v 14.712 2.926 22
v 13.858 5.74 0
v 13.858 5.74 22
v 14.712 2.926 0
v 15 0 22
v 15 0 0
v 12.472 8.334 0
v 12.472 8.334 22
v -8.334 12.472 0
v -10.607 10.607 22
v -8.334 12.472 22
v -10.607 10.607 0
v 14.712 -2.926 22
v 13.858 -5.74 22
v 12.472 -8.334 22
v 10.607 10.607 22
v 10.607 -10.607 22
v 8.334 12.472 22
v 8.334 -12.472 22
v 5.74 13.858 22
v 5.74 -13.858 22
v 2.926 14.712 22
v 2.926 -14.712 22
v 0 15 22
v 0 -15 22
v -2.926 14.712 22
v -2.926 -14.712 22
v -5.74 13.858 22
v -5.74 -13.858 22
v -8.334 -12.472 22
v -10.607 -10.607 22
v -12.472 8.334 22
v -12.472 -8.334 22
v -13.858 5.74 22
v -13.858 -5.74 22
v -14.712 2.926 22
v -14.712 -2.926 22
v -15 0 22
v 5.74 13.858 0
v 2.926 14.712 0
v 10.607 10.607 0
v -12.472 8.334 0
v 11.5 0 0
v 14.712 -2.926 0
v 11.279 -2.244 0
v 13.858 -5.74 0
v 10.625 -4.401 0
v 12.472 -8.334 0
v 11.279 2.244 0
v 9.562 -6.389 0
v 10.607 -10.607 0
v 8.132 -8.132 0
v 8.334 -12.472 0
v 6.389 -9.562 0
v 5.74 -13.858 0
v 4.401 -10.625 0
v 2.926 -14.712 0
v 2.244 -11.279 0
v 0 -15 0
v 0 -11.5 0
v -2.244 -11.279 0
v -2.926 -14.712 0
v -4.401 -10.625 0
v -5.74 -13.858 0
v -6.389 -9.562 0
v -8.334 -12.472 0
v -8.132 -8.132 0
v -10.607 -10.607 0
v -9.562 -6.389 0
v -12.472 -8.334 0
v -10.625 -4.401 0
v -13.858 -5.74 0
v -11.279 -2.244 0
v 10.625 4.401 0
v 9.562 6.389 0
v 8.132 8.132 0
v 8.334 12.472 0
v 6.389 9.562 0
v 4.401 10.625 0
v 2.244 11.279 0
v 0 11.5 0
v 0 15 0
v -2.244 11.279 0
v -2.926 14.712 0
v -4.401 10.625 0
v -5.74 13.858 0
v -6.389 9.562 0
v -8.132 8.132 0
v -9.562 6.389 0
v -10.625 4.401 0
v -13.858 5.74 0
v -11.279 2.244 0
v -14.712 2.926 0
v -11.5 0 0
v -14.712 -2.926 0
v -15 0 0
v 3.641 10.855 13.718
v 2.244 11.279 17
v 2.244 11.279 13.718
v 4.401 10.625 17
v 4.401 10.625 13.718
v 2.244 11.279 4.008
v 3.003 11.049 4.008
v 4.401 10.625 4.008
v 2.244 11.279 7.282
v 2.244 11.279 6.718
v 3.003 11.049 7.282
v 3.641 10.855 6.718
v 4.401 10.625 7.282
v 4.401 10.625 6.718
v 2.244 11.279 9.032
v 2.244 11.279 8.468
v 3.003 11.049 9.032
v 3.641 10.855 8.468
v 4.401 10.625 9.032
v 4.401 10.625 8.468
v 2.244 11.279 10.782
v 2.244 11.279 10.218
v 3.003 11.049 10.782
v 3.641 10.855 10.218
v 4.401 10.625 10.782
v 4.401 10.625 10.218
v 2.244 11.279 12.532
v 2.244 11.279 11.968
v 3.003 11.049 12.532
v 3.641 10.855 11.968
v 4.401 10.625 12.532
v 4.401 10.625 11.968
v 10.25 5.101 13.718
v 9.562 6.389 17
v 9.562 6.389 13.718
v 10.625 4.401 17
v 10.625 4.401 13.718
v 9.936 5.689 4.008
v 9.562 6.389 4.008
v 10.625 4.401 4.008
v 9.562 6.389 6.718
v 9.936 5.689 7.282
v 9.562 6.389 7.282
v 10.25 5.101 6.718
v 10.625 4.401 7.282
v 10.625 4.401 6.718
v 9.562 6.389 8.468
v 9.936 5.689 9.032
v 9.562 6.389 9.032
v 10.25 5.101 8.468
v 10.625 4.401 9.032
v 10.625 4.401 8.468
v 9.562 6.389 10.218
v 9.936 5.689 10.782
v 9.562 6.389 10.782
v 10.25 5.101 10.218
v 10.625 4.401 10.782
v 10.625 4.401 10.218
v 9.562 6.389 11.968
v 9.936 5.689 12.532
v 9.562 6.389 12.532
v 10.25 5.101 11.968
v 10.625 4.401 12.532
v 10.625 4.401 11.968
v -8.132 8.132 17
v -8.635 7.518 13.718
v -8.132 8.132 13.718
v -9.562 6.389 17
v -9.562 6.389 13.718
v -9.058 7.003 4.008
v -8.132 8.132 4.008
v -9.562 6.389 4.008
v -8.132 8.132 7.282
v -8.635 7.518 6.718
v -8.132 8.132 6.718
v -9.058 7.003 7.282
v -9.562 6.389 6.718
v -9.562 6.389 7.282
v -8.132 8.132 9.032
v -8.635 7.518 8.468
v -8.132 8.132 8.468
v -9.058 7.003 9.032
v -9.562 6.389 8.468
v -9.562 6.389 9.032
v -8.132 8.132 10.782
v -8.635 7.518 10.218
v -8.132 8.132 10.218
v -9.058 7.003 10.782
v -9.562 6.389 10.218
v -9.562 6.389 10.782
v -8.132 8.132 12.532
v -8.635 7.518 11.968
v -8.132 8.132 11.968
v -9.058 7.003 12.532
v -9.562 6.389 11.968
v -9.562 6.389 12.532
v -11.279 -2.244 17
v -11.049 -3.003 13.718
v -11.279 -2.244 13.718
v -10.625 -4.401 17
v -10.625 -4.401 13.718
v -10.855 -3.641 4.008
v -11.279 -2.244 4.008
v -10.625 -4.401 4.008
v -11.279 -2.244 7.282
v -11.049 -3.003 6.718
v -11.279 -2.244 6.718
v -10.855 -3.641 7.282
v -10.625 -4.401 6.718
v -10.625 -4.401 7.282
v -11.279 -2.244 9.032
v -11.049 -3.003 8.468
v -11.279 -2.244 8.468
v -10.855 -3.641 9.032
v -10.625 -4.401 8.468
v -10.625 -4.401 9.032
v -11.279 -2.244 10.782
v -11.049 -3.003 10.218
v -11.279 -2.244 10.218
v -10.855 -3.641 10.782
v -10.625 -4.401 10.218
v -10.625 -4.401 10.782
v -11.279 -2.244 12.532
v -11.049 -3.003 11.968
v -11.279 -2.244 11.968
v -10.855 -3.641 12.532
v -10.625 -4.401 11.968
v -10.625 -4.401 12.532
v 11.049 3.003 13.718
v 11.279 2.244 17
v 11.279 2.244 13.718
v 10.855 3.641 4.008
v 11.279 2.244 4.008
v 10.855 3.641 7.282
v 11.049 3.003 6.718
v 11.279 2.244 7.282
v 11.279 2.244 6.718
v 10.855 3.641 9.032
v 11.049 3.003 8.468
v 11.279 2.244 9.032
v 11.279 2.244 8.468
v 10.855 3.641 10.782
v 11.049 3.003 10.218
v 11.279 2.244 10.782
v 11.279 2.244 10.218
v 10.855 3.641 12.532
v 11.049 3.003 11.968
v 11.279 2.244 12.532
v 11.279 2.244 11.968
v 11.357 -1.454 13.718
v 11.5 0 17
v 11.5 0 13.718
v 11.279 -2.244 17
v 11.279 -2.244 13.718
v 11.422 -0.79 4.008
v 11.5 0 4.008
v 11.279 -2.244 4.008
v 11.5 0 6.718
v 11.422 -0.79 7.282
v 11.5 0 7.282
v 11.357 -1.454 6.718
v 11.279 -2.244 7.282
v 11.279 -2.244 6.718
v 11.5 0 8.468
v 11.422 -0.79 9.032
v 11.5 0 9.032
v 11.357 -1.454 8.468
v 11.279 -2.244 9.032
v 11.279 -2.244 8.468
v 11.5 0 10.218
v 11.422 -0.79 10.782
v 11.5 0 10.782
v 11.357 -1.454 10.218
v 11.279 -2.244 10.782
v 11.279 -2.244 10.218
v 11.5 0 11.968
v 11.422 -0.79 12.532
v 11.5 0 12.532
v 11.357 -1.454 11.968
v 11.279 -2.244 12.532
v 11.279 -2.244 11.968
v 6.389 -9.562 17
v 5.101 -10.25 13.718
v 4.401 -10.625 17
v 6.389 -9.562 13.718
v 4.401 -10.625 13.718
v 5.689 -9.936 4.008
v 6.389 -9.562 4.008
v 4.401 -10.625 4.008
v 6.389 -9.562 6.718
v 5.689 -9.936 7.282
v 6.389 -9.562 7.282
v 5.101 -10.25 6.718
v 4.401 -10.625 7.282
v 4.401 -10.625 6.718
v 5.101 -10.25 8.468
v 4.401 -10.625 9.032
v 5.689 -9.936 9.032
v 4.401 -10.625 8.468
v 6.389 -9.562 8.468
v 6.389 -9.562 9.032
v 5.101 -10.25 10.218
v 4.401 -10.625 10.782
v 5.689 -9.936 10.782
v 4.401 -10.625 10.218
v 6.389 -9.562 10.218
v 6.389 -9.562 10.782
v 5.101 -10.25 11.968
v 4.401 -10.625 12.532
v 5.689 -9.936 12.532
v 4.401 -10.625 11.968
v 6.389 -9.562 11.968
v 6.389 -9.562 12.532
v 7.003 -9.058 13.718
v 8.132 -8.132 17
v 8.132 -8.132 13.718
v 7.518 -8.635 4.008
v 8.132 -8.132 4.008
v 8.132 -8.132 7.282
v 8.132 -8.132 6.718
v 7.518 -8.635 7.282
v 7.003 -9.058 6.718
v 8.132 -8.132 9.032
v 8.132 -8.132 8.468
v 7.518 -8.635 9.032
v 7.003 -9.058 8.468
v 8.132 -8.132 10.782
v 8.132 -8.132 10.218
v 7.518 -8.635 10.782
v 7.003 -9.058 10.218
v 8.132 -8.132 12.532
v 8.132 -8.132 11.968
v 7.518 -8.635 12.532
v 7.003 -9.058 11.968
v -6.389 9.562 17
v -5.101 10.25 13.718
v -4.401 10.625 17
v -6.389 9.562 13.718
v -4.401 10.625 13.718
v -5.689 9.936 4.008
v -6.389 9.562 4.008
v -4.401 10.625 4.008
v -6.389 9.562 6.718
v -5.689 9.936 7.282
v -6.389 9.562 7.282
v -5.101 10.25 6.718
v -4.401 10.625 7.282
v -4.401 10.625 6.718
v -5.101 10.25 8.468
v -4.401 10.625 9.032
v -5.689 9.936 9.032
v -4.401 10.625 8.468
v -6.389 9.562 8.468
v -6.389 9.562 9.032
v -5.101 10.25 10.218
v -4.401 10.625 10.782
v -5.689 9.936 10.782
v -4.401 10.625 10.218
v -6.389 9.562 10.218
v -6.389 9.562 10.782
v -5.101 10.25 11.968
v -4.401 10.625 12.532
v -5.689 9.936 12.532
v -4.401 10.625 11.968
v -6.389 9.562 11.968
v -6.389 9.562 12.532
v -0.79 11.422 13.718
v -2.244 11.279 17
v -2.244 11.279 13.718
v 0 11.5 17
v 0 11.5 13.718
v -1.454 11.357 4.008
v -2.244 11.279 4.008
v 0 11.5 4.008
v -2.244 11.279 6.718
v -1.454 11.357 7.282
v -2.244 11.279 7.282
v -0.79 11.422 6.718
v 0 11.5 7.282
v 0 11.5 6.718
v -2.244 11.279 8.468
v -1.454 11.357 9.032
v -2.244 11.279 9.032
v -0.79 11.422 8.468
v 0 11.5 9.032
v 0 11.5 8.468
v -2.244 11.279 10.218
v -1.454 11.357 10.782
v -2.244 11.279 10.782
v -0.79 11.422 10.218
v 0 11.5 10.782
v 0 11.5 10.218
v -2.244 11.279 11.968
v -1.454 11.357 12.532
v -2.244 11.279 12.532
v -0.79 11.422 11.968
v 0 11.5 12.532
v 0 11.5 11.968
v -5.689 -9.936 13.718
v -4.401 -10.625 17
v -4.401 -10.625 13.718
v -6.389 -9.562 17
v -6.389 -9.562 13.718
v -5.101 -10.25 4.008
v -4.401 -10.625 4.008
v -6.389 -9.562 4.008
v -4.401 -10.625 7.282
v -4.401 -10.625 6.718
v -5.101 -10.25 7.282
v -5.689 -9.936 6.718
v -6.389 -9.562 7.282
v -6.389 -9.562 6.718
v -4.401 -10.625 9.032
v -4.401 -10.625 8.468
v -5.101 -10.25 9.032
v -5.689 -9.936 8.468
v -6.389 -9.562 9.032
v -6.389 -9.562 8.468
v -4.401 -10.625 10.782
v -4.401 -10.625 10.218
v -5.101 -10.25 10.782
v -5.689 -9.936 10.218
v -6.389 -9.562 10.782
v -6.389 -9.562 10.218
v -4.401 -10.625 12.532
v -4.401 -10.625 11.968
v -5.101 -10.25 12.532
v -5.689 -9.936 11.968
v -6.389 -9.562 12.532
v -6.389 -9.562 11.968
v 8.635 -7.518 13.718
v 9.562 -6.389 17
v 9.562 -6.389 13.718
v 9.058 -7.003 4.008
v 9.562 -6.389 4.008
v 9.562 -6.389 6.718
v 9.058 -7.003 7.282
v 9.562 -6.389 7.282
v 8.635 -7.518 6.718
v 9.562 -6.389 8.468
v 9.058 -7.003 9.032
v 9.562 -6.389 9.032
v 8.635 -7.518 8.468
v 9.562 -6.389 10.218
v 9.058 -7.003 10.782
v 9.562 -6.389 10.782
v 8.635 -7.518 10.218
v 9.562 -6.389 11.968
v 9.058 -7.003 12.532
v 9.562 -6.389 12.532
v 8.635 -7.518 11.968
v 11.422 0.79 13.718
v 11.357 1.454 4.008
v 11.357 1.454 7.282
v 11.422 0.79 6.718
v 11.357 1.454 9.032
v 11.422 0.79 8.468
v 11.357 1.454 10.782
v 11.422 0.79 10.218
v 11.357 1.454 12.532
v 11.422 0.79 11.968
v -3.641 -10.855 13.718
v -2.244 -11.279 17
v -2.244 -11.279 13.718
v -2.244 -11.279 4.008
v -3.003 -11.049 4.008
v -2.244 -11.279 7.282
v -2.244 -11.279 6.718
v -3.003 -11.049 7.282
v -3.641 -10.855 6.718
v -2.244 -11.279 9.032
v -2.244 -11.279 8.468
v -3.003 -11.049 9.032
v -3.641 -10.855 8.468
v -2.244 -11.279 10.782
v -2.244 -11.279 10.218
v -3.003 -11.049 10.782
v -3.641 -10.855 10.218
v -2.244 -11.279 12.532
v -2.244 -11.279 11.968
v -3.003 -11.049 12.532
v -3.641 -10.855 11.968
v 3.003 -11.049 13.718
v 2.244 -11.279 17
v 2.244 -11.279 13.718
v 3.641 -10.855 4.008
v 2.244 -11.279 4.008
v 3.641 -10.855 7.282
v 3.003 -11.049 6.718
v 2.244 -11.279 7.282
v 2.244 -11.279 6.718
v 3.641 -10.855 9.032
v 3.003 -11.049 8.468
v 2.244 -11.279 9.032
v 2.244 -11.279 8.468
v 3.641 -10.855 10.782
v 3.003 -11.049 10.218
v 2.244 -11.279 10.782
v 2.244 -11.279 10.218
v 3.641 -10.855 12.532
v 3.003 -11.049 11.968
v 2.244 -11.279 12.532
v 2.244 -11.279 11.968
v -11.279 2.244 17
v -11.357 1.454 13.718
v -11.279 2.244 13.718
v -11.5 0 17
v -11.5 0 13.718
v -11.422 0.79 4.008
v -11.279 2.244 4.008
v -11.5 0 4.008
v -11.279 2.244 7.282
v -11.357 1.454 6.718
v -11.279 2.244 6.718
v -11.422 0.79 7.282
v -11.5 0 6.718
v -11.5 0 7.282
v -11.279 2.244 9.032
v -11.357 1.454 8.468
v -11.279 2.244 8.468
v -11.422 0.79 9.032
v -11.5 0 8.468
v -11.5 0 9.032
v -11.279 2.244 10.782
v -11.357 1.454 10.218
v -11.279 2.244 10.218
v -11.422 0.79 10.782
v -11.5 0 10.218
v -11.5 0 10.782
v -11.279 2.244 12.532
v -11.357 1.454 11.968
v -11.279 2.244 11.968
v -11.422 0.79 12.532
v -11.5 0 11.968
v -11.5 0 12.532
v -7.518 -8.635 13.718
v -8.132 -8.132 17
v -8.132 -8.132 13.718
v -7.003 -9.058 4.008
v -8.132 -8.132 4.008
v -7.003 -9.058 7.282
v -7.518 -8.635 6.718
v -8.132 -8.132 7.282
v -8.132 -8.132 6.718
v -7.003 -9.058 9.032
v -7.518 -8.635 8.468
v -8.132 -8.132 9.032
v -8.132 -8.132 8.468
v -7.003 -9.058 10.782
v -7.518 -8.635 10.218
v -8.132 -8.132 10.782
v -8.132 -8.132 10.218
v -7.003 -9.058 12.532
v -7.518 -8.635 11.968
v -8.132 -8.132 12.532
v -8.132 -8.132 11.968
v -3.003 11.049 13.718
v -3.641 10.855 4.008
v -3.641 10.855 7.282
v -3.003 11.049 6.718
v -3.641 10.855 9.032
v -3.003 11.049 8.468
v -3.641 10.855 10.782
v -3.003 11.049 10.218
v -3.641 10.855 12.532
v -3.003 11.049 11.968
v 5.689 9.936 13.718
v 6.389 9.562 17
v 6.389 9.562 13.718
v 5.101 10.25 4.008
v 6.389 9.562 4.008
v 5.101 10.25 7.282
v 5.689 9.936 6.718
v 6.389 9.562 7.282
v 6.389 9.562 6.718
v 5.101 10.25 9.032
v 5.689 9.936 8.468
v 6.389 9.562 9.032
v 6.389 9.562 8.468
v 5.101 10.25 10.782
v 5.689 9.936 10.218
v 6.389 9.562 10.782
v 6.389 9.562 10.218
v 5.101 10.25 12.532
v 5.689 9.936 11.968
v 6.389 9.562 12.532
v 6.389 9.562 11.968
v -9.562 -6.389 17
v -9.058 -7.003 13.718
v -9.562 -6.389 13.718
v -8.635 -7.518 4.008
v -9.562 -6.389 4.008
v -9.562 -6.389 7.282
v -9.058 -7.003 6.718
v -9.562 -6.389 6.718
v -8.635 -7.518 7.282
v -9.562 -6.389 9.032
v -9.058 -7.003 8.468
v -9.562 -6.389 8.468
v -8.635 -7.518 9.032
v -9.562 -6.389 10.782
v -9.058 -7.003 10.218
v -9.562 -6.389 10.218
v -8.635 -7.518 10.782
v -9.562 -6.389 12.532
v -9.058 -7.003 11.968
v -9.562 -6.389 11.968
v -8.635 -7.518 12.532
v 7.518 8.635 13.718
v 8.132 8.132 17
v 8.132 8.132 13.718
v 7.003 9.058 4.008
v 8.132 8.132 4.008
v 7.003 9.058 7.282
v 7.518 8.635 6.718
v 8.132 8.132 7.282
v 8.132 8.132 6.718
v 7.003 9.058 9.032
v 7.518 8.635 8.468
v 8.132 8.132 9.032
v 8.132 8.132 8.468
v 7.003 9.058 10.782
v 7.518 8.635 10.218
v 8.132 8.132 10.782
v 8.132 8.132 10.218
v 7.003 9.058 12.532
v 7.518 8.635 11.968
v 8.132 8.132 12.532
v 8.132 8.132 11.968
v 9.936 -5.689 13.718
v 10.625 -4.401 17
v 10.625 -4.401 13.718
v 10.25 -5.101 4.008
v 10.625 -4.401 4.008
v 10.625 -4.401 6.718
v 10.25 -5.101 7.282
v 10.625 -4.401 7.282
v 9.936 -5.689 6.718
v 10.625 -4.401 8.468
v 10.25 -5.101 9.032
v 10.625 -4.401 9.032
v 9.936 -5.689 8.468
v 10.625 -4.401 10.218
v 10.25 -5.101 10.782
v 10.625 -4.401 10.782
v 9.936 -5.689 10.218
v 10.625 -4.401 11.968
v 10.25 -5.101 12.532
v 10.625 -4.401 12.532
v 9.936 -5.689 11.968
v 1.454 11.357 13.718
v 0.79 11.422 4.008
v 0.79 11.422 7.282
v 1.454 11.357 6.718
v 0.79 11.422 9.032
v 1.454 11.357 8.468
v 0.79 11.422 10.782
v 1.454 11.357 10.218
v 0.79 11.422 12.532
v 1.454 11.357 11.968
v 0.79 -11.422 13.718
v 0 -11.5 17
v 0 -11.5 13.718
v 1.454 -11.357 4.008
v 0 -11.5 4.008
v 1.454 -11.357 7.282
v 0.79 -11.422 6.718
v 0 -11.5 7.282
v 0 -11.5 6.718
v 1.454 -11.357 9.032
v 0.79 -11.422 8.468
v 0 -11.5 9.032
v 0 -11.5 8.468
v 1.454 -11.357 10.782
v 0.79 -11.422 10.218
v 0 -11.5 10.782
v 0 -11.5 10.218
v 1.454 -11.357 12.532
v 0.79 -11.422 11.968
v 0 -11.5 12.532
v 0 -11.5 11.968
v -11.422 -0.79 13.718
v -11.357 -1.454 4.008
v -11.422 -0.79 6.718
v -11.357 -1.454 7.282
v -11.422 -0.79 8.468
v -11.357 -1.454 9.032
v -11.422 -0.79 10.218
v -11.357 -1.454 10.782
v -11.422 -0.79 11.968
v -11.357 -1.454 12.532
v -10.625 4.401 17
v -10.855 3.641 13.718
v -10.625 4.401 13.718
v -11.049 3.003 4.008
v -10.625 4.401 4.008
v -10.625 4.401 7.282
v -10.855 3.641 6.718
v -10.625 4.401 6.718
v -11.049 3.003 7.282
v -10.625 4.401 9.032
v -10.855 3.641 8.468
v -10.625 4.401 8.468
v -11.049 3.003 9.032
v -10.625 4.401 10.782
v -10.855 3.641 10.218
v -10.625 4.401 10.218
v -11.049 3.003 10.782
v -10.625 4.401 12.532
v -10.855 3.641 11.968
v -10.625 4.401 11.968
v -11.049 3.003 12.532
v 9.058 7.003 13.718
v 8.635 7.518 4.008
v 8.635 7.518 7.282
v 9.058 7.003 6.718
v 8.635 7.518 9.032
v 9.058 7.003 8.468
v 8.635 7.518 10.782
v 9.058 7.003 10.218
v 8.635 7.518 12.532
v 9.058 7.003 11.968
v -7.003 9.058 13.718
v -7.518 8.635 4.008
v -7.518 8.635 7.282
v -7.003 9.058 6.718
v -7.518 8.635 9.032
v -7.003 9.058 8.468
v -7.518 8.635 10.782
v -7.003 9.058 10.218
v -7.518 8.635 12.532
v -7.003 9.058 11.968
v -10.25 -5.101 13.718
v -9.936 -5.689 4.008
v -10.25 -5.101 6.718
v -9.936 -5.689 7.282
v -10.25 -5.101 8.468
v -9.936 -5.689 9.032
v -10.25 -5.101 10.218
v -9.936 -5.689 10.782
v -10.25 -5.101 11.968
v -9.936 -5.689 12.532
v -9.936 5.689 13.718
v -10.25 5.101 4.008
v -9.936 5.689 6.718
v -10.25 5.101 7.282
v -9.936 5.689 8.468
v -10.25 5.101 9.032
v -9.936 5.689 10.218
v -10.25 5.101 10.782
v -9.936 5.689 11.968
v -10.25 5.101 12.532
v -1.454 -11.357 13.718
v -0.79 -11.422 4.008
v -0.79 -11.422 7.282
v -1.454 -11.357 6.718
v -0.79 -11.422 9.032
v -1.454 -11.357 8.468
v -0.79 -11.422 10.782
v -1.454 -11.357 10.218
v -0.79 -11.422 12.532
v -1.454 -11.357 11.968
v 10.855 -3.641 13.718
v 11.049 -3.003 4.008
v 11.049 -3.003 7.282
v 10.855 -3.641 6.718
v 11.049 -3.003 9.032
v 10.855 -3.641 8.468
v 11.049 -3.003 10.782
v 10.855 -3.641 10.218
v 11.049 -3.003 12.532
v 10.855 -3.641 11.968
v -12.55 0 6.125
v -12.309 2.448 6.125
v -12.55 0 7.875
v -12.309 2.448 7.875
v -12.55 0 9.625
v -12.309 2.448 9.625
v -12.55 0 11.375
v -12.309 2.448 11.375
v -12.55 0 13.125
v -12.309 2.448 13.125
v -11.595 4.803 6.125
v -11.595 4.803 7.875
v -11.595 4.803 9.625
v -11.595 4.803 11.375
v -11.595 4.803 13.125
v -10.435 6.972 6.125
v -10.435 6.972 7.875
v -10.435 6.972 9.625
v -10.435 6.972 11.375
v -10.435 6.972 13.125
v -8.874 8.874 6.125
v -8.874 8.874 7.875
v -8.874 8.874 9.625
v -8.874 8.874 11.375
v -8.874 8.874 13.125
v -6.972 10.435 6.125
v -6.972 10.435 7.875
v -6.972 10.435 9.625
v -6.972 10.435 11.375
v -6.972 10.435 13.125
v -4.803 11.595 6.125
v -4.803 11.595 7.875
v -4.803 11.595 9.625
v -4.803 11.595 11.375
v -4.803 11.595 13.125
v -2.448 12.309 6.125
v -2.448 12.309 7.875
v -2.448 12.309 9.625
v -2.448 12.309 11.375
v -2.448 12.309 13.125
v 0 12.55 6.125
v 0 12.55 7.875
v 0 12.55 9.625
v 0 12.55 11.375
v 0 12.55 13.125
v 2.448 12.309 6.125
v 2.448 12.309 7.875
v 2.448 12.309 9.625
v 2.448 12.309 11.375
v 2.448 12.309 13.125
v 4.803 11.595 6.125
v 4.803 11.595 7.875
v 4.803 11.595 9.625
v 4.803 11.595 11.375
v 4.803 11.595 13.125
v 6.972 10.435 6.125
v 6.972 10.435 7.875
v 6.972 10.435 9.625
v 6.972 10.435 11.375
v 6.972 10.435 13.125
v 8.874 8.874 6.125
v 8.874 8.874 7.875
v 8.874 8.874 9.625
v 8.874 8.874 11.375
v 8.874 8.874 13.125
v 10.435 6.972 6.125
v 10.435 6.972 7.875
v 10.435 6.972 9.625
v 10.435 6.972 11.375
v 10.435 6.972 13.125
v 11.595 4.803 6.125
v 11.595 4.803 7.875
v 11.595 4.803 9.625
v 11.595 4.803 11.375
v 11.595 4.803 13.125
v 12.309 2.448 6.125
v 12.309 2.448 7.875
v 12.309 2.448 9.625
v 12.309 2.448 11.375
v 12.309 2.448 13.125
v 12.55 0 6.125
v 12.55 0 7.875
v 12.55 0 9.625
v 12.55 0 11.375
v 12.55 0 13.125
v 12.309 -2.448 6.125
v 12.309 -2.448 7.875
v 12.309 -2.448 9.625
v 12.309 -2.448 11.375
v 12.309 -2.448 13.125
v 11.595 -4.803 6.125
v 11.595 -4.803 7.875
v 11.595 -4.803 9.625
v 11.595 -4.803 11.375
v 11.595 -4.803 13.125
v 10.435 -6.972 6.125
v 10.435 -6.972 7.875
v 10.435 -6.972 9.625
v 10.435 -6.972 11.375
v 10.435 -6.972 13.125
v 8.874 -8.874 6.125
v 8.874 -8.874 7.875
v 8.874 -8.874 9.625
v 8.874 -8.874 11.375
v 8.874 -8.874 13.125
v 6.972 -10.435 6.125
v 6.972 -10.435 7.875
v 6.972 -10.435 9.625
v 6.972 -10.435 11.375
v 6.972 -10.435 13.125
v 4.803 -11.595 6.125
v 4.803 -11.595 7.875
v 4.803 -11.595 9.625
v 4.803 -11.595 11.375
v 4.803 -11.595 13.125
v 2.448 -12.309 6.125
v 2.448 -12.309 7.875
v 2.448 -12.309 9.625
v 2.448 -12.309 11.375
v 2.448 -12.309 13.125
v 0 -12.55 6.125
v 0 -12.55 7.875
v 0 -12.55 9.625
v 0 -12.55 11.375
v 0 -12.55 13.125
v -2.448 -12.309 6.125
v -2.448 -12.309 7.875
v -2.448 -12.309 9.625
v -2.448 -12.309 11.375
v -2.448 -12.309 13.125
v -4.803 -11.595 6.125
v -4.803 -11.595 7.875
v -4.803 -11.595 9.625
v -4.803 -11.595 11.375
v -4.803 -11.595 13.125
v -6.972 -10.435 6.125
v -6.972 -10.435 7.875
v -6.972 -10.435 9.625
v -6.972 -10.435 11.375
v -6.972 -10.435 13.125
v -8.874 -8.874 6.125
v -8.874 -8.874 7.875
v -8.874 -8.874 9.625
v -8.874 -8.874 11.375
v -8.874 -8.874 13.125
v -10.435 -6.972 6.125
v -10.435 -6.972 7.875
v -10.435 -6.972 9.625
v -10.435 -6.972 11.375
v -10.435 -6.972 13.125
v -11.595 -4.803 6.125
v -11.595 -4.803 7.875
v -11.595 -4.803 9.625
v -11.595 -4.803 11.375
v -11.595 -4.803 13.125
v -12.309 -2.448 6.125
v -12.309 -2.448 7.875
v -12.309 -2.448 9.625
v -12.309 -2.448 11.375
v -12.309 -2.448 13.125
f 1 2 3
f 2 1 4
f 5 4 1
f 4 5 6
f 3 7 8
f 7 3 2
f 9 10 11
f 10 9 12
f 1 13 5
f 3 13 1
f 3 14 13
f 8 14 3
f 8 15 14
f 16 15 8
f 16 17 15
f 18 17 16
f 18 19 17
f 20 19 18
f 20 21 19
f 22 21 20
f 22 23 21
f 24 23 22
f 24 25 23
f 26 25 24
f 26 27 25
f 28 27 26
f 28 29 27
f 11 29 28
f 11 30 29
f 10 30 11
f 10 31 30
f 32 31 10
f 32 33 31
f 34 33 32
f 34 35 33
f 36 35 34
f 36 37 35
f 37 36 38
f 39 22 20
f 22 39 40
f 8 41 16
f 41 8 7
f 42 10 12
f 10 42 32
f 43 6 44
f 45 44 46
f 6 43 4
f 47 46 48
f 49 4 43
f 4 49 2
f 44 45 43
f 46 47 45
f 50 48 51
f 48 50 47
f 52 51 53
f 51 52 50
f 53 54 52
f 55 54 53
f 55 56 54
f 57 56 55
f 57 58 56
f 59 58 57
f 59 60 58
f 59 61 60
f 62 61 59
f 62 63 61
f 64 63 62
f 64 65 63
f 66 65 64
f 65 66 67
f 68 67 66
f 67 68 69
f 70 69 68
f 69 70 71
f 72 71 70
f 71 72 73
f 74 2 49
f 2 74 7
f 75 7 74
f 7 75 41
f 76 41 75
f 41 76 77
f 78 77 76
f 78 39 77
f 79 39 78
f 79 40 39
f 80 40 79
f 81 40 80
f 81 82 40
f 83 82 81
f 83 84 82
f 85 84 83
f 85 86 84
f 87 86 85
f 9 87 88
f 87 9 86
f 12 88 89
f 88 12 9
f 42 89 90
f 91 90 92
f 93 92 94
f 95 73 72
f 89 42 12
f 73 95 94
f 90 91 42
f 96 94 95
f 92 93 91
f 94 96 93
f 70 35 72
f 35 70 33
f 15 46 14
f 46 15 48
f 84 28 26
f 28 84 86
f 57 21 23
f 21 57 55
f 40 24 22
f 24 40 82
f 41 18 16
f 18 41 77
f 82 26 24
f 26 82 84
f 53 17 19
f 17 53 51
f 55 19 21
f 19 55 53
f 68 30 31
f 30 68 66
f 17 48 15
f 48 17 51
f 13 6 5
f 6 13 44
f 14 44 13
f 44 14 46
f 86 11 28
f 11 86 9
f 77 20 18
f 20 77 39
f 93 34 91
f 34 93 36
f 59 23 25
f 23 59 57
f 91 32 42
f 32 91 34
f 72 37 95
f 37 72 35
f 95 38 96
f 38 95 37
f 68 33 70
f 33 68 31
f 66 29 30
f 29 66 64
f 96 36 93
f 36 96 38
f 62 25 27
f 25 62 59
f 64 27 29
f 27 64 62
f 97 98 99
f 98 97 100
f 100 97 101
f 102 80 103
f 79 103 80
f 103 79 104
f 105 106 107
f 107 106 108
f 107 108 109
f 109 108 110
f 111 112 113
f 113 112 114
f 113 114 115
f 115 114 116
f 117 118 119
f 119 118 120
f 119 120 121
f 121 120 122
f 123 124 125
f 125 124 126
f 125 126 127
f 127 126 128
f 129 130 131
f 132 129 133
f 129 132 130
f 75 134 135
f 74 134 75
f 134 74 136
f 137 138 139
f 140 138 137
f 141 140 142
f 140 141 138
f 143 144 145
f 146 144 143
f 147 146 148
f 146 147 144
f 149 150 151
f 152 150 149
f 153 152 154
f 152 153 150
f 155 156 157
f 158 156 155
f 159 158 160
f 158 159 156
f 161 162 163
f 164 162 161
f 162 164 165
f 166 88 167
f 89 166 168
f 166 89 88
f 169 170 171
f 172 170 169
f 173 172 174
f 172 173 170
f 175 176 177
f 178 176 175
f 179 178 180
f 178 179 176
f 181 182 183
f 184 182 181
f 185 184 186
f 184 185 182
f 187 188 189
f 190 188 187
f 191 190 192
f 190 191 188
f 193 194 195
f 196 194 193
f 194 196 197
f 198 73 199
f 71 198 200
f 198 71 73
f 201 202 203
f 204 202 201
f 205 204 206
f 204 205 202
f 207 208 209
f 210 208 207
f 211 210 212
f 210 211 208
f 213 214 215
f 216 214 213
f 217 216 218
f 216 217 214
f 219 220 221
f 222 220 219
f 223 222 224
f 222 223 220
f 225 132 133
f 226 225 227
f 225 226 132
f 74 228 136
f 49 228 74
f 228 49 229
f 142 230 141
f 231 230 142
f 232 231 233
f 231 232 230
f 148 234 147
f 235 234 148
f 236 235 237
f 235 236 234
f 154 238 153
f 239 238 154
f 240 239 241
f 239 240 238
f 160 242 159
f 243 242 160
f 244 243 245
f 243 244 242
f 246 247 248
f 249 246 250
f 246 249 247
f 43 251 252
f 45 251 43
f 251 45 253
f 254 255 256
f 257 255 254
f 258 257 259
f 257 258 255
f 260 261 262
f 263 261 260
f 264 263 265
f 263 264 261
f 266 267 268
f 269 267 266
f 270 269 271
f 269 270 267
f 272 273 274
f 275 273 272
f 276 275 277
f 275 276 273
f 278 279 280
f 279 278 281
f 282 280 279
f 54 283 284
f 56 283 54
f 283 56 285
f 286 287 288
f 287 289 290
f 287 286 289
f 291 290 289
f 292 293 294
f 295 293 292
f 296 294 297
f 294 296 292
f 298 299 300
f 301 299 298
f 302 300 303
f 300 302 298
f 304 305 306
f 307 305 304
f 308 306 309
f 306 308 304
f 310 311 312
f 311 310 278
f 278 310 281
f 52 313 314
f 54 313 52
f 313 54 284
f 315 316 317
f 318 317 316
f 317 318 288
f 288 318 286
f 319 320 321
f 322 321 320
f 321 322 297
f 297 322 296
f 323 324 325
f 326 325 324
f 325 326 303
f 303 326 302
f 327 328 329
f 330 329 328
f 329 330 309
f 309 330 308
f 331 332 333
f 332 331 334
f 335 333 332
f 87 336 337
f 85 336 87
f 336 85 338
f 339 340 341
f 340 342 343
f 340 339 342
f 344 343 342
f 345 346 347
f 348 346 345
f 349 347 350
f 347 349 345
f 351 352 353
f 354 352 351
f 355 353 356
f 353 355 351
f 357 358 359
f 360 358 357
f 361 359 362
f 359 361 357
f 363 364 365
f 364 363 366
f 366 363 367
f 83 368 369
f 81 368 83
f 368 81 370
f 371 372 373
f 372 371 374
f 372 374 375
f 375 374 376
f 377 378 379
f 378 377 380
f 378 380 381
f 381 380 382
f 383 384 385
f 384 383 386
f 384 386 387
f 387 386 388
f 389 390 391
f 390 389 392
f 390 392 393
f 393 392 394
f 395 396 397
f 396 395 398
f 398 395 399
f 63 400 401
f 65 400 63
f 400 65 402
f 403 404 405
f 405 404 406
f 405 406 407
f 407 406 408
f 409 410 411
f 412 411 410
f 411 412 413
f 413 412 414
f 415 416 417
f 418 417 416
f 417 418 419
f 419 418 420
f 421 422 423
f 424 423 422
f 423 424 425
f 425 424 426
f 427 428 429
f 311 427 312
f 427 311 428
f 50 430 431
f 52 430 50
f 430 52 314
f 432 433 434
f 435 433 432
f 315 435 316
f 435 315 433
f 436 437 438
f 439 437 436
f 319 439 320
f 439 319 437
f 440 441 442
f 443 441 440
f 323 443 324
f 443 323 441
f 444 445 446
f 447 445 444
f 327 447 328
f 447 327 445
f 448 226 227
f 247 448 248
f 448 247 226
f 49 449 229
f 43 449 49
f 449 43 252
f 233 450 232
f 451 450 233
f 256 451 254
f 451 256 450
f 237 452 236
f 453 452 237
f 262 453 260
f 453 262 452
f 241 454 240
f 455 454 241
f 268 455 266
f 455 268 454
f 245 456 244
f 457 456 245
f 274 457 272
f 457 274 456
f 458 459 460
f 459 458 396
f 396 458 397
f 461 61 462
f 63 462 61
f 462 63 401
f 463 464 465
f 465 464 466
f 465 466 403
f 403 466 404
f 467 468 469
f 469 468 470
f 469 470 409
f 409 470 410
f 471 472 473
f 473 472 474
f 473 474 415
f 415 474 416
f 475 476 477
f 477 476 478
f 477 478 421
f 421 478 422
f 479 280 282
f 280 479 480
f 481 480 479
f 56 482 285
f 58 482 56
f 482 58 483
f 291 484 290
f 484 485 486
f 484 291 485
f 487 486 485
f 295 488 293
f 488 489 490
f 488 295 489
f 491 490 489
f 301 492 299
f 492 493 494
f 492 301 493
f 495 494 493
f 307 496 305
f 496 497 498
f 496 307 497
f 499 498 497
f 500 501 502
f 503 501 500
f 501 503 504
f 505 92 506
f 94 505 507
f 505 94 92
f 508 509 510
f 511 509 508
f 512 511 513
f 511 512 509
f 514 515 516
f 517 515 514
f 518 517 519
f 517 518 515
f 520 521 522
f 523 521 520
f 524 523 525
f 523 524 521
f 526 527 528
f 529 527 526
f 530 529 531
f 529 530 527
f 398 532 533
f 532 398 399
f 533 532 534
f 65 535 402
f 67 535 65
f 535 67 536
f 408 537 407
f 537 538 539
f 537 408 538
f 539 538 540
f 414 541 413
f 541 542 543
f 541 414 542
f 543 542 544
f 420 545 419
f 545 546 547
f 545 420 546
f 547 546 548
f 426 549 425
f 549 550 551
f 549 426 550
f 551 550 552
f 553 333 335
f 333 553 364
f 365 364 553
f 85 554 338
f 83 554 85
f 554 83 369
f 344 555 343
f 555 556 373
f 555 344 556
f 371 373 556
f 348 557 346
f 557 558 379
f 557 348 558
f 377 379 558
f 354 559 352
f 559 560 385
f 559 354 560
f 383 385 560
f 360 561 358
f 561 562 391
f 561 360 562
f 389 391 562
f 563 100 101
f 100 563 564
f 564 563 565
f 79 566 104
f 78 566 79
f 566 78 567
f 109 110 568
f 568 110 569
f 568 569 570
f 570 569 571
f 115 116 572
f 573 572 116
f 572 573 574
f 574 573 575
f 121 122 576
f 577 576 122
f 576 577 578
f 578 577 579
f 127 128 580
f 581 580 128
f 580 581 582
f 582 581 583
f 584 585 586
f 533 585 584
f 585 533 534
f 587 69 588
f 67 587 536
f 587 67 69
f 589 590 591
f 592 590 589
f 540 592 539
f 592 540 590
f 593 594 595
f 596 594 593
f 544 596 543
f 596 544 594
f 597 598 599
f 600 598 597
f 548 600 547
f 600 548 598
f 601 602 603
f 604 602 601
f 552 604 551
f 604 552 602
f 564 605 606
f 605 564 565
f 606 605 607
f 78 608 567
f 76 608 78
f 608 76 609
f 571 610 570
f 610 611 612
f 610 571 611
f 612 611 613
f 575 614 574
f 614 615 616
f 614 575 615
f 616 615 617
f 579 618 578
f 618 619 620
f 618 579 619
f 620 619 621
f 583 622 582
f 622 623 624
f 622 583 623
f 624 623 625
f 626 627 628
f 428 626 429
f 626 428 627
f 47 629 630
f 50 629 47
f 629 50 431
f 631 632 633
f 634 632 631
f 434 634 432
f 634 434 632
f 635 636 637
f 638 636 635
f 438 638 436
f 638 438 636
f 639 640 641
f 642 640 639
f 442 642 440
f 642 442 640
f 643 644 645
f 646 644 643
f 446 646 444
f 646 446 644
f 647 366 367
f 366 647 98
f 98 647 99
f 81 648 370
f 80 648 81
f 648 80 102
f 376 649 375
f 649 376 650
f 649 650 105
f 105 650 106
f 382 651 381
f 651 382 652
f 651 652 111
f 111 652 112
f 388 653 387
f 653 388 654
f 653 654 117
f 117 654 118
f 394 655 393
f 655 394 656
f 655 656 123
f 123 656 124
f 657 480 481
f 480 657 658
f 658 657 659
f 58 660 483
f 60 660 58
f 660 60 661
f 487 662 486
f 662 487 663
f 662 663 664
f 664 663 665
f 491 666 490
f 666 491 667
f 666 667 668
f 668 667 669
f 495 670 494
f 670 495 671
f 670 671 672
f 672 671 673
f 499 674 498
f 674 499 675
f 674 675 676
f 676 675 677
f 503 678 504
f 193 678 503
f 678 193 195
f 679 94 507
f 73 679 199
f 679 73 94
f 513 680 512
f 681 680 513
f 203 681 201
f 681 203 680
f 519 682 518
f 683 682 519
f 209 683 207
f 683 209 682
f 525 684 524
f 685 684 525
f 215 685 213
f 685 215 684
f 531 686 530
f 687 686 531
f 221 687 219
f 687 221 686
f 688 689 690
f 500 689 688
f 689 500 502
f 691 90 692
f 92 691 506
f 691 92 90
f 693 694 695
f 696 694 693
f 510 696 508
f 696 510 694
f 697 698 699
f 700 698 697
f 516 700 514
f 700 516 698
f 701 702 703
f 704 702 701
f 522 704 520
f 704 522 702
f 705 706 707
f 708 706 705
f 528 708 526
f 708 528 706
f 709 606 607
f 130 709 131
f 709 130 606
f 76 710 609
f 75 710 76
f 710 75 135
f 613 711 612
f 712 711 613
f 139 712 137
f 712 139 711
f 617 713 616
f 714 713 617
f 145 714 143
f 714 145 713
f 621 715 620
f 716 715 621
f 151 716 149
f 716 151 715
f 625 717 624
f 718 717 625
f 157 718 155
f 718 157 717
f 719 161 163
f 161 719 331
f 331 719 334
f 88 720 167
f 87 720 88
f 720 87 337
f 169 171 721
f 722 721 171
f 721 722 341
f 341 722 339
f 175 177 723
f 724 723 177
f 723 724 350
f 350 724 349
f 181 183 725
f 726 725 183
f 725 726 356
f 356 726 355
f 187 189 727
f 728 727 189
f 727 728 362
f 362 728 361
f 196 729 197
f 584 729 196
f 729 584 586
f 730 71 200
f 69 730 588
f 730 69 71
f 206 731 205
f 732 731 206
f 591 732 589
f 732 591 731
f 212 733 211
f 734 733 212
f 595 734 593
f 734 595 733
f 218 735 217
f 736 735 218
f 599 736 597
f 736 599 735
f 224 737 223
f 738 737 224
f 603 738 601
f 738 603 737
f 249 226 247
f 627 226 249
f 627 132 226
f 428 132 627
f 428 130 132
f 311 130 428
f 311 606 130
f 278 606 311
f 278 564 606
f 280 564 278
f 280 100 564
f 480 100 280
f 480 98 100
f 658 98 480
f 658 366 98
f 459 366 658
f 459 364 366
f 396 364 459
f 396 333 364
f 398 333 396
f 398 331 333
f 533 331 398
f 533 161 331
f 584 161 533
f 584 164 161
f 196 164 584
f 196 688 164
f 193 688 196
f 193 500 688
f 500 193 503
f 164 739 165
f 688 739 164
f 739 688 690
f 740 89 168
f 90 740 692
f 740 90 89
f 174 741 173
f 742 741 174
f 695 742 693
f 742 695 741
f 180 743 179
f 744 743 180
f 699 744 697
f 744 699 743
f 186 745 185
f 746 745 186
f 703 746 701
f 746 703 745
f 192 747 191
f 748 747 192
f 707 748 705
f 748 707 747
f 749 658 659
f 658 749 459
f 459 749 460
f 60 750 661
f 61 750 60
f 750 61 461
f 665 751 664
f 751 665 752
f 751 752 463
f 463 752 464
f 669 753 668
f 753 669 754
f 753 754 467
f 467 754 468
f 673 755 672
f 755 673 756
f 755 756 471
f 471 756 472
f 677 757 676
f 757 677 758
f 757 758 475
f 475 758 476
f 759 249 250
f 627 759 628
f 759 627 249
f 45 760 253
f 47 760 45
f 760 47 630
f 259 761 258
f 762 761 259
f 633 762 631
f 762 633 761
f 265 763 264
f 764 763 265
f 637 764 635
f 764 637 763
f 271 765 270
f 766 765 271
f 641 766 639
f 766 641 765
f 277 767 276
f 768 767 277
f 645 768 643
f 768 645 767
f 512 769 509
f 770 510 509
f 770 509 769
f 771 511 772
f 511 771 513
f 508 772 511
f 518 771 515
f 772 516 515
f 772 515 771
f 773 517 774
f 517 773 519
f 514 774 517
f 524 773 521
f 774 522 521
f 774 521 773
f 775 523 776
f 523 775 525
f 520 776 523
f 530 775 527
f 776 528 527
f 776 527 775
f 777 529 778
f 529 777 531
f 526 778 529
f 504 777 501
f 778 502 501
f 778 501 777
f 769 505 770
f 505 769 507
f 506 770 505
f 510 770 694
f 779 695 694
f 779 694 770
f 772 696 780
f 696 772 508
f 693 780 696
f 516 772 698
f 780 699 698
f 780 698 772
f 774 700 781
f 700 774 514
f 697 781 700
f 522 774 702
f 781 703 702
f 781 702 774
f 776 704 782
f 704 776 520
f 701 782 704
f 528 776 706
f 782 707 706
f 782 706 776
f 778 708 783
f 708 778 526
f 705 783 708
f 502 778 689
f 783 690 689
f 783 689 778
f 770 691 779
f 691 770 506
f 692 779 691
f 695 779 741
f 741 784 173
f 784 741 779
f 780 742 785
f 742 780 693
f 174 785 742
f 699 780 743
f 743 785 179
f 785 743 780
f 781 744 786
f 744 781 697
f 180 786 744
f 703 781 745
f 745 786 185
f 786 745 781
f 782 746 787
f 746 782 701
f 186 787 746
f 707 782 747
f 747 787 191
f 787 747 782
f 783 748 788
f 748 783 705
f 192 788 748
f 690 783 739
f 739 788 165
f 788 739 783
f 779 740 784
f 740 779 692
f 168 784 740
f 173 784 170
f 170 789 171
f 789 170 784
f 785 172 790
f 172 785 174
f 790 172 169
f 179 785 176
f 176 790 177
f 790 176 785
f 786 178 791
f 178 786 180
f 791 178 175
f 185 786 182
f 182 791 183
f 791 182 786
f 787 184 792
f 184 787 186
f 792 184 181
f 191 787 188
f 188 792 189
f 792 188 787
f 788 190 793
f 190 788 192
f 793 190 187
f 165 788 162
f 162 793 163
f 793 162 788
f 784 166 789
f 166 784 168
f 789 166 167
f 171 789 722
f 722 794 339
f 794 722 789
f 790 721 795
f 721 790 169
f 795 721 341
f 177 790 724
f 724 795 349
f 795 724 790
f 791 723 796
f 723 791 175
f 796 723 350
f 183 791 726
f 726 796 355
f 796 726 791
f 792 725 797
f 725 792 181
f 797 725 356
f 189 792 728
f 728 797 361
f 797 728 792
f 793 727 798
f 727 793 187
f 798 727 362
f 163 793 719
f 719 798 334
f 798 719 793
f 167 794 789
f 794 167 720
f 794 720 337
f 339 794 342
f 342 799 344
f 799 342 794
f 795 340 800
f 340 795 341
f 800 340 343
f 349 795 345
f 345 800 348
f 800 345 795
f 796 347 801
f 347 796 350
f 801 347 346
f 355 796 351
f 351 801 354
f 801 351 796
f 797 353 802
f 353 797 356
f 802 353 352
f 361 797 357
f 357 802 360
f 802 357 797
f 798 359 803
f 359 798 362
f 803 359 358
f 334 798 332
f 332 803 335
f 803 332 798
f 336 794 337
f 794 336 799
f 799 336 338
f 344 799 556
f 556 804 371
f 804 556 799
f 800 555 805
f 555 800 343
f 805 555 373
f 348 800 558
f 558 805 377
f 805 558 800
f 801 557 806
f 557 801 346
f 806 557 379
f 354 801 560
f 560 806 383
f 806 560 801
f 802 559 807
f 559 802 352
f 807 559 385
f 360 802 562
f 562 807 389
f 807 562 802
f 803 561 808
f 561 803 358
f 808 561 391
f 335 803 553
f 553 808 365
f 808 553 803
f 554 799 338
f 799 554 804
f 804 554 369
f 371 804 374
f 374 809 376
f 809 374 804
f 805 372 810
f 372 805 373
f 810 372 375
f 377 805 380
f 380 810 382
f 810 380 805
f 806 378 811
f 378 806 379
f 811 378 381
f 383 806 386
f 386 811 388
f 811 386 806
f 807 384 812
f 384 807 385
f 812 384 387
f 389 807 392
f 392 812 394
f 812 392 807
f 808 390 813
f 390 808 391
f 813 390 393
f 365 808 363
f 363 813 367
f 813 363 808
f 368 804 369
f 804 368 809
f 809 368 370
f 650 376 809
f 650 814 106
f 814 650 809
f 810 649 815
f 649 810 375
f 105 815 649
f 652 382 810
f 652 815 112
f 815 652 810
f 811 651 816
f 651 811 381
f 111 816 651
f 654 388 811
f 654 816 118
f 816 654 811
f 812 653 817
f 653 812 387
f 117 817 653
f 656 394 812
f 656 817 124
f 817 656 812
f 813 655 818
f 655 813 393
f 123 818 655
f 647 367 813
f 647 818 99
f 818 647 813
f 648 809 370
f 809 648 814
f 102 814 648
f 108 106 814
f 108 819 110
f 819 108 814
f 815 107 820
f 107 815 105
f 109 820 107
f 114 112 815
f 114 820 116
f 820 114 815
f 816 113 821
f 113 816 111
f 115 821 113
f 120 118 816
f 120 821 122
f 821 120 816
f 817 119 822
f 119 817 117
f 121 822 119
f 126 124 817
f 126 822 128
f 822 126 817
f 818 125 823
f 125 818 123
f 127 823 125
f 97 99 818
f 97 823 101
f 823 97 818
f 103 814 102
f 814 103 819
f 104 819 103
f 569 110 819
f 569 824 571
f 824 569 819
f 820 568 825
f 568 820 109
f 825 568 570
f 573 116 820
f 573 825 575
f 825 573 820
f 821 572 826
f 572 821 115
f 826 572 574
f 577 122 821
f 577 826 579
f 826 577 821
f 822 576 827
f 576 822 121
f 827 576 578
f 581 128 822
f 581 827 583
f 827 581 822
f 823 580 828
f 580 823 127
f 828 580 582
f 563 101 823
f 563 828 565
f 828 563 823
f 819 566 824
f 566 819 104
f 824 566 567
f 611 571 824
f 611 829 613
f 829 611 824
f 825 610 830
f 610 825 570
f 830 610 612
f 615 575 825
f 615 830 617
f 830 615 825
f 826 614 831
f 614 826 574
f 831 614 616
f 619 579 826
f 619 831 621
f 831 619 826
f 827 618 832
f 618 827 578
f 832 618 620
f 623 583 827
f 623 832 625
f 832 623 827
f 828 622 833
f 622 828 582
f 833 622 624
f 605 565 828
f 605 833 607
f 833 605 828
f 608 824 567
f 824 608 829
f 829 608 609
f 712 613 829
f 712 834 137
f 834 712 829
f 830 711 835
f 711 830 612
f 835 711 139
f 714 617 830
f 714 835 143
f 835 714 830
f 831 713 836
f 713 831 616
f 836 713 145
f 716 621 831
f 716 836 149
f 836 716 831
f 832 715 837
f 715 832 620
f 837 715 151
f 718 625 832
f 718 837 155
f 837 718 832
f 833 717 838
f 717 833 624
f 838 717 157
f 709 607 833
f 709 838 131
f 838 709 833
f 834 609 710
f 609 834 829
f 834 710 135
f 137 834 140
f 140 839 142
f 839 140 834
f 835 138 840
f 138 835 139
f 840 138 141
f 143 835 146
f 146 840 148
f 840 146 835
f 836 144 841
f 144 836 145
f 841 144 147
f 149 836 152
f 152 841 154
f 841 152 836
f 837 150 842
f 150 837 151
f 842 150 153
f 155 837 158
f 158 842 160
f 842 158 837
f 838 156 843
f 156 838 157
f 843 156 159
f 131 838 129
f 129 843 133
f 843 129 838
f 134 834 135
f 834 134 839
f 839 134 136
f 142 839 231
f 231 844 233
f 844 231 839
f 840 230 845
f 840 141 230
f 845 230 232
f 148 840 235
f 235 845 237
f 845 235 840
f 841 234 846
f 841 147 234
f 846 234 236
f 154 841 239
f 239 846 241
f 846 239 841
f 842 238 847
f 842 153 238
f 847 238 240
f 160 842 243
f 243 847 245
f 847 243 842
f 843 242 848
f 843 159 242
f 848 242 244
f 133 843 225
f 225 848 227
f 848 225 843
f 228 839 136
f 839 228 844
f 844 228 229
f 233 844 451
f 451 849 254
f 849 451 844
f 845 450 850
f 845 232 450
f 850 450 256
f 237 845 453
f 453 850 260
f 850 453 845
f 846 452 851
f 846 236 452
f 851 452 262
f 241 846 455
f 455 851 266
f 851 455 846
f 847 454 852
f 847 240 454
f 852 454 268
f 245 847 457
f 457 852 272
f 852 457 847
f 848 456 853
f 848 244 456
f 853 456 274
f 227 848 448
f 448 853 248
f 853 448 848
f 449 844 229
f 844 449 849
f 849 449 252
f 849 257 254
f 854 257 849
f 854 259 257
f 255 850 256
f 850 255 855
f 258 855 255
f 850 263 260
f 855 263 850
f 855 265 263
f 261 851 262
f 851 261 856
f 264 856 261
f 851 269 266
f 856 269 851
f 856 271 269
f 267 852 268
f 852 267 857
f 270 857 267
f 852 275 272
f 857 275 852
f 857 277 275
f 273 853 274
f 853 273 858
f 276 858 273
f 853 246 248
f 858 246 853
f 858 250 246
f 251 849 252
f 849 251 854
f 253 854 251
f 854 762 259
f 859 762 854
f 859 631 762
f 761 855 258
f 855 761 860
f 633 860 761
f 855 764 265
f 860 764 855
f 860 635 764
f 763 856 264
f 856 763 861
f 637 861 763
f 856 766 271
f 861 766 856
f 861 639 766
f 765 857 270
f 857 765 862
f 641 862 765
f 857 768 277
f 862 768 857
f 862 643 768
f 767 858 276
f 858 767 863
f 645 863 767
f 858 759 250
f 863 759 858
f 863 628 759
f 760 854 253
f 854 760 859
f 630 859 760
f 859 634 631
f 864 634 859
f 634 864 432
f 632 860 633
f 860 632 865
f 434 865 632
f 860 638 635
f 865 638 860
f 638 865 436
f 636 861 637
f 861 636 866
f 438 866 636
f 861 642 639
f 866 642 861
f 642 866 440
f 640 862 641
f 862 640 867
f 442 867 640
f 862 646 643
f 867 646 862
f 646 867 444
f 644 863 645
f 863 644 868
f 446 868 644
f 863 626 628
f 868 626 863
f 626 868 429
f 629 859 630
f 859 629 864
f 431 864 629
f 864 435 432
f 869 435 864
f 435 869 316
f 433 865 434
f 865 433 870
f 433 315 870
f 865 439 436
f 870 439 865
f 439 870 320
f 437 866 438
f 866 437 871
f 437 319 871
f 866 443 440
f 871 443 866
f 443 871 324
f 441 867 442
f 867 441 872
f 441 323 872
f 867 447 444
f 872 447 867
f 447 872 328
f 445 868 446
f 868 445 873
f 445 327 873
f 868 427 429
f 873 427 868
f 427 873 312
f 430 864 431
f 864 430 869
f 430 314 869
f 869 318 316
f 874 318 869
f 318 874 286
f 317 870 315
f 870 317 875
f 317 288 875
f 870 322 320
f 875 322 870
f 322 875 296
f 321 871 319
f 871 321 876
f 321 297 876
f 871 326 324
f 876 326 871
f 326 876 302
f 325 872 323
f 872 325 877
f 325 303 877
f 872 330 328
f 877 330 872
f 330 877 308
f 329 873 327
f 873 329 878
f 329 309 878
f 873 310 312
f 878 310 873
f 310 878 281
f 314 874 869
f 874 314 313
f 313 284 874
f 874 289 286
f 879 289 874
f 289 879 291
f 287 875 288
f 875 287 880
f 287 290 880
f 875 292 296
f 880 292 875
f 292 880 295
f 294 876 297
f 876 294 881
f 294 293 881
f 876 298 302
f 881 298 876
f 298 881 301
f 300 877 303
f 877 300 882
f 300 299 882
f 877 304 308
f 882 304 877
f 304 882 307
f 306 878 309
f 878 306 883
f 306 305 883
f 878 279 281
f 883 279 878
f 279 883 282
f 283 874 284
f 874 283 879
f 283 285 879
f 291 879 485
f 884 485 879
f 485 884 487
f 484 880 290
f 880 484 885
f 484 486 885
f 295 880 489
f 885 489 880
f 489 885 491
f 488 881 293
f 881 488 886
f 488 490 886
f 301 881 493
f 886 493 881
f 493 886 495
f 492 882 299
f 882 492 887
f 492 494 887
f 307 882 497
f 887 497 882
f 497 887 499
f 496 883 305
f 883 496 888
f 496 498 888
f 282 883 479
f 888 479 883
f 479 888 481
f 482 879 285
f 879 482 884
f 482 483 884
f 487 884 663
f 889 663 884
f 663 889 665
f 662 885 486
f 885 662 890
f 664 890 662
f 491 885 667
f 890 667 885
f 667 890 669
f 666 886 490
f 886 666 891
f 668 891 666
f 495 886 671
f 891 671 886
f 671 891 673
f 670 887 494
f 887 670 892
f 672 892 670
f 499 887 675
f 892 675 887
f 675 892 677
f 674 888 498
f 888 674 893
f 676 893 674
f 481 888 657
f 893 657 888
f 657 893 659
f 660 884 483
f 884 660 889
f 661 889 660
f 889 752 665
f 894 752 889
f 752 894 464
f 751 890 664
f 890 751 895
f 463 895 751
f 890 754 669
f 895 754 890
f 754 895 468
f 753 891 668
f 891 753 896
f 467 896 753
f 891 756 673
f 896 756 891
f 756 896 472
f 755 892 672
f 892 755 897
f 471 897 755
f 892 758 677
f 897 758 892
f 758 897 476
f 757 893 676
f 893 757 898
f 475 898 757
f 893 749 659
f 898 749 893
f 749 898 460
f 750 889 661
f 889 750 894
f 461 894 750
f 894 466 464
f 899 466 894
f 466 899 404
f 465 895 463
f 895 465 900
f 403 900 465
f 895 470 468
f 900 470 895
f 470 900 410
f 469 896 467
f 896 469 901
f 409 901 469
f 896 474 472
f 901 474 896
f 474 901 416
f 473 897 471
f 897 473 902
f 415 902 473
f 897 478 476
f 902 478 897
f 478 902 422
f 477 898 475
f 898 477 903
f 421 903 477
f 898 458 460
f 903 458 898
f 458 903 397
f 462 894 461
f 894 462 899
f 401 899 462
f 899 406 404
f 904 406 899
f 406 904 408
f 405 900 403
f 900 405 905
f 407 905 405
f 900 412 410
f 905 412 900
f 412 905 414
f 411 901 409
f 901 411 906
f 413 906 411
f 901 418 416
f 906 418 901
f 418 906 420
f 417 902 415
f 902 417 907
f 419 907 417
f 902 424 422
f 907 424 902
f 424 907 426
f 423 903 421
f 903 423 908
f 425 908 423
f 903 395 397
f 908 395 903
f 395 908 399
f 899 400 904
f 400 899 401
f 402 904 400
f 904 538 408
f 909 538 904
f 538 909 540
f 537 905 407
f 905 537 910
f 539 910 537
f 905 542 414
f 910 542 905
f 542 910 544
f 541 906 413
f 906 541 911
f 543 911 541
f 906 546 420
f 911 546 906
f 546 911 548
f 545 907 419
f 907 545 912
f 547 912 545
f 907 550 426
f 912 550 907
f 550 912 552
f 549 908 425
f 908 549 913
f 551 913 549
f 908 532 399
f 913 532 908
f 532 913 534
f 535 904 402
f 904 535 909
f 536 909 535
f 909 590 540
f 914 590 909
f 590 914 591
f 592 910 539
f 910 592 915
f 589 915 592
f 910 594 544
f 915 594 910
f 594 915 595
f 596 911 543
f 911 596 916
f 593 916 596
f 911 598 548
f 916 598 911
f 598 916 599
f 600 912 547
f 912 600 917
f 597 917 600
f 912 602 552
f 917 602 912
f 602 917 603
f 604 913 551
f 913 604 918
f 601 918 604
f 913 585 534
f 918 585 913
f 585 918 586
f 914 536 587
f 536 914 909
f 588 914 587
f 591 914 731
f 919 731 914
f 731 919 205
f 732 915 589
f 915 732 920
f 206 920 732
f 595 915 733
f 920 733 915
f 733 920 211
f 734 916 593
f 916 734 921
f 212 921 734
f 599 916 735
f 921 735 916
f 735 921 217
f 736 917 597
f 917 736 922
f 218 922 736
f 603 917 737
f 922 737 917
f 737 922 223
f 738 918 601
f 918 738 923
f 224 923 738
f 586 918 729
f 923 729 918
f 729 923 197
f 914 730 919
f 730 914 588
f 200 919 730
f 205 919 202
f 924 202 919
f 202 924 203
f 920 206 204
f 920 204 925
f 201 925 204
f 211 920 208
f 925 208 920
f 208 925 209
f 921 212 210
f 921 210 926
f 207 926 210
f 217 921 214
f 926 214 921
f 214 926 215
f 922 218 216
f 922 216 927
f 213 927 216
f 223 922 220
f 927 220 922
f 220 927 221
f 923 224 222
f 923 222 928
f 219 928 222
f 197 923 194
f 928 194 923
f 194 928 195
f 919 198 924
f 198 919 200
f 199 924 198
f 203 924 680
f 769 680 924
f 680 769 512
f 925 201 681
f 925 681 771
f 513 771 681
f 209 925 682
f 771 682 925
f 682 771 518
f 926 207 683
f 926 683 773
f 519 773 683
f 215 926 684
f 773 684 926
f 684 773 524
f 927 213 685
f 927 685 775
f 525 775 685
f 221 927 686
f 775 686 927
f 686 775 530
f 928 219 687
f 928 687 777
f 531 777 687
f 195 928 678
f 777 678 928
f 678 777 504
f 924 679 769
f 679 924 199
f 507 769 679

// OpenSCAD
$fn = 32;

// ----------------------------------------------------------------------
// Threaded cap: 30 mm body, 22 mm tall, 23 mm threaded bore
// ----------------------------------------------------------------------

// --- parameters (mm) ---
outer_d = 30;             // cap outside diameter
body_h = 22;              // cap height
top_t = 5;                // closed top thickness
bore_d = 23;              // bore core diameter
pitch = 1.75;             // thread pitch
thread_d = 1.05;          // thread depth
thread_z = 3;             // thread start above the rim
thread_h = 11;            // threaded height

difference() {
  union() {
    cylinder(h = 22, d = outer_d);
  }
  /* threaded bore, closed at the top */
  translate([0, 0, -2.5]) cylinder(h = 19.5, d = bore_d);
  translate([0, 0, 3]) rotate_extrude() polygon([[10.5, 0], [10.5, 11], [11, 11], [12.55, 10.125], [11, 9.25], [12.55, 8.375], [11, 7.5], [12.55, 6.625], [11, 5.75], [12.55, 4.875], [11, 4], [12.55, 3.125], [11, 0], [10.5, 0]]);
}
